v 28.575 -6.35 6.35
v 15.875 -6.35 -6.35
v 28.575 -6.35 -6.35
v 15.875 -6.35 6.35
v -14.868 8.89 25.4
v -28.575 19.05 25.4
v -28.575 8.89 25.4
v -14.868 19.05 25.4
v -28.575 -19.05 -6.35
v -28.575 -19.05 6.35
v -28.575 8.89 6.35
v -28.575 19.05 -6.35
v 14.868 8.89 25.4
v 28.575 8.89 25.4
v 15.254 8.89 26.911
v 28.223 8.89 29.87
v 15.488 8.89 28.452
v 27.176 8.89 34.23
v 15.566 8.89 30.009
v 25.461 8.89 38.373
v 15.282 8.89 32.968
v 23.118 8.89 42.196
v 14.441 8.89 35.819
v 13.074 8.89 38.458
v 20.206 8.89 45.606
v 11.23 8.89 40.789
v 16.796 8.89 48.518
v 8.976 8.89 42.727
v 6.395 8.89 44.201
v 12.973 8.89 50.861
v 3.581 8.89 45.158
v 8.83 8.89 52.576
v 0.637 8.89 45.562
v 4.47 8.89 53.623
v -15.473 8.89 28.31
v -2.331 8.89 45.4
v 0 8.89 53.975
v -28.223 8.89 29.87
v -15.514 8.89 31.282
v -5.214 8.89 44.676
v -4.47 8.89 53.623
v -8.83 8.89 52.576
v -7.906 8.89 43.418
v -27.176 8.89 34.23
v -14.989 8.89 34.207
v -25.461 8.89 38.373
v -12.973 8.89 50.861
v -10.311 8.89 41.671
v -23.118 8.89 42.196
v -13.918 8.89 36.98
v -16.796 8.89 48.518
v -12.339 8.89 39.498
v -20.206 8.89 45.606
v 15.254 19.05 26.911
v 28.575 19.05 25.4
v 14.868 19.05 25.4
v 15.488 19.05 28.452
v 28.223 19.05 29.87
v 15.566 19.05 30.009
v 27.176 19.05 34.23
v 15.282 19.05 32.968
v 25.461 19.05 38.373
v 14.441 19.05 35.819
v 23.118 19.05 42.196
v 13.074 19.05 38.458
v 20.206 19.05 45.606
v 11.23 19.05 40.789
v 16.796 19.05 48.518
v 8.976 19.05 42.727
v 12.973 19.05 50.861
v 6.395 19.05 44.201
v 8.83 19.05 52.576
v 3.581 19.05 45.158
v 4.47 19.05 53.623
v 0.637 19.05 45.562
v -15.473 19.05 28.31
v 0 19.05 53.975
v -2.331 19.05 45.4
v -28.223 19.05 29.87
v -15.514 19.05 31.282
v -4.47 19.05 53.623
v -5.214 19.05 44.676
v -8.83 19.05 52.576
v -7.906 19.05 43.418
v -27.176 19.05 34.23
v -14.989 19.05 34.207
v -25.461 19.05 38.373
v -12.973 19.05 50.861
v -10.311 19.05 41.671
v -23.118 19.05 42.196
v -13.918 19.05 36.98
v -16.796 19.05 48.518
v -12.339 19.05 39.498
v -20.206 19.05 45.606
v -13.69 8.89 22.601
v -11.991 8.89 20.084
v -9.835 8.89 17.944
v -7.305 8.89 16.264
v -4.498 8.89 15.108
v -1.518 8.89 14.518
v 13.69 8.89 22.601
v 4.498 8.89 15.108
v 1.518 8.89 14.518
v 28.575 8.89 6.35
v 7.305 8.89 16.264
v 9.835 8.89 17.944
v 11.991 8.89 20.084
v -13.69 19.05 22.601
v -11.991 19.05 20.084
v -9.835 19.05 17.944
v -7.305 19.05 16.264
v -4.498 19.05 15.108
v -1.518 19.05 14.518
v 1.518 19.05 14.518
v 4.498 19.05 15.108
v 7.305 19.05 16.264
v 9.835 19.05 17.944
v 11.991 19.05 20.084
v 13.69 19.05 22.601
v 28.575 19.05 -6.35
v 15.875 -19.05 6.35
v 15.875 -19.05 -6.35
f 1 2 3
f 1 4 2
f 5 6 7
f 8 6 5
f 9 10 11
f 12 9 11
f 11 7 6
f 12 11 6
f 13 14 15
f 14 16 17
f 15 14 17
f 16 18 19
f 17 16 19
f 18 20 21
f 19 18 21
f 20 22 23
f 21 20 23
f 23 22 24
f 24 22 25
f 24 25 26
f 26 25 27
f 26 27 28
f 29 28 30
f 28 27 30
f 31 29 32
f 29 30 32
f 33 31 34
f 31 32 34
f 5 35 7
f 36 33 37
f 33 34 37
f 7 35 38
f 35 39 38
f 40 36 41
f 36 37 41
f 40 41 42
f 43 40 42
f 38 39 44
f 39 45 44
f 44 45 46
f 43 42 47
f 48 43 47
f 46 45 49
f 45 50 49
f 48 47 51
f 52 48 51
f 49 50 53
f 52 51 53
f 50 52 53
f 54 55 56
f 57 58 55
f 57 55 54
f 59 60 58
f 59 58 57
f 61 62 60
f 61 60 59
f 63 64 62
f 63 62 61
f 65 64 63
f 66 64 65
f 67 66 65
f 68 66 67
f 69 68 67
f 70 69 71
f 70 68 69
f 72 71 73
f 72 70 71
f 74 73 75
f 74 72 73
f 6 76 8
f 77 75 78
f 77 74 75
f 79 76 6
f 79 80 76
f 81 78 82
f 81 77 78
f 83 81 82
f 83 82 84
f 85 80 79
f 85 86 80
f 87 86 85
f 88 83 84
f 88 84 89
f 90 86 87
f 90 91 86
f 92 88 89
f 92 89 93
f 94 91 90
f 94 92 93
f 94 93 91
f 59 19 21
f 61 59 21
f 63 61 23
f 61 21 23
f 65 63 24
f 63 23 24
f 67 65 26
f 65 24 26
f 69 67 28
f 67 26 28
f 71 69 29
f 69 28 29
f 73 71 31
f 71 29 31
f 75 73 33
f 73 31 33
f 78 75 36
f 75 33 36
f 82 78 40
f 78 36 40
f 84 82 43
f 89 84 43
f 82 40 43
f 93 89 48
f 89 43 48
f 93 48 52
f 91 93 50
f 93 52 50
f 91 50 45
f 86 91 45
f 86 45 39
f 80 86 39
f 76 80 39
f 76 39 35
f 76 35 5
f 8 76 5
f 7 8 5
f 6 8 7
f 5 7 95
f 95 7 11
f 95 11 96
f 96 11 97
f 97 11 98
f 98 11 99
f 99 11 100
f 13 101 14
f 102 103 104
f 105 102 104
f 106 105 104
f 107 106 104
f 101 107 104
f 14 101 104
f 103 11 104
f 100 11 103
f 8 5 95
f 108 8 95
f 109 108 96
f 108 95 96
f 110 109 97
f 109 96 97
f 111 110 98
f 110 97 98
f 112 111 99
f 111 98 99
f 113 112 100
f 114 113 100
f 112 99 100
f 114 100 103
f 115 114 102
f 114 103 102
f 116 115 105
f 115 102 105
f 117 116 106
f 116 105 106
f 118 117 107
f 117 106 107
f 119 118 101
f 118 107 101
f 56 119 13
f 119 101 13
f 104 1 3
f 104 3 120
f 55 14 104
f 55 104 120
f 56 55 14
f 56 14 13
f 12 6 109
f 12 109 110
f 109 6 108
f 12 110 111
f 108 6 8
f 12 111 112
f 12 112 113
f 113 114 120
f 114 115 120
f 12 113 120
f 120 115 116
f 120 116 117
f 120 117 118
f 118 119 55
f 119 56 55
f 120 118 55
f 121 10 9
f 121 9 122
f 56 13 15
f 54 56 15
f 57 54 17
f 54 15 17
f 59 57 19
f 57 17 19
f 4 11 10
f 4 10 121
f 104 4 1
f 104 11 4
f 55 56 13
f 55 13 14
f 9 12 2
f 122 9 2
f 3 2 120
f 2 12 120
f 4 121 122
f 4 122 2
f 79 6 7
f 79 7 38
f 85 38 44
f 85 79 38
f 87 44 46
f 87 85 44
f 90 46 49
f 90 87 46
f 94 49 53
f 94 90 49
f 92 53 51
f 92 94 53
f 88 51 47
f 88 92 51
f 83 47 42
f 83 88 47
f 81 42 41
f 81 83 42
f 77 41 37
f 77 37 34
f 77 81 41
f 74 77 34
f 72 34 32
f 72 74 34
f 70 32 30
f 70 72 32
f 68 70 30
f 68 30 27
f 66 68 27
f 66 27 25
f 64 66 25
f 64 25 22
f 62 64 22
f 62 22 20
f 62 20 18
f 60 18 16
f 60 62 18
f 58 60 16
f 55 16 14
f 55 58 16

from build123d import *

# Parameters (mm, degrees)
F0_W     = 57.15
F0_H     = 38.1
F1_DEPTH = 6.35
F2_W     = 12.7
F2_H     = 12.7
F3_DEPTH = 6.35
F4_W     = 57.15
F4_H     = 10.16
F5_DEPTH = 25.4
F7_DEPTH = 10.16
F9_DEPTH = 10.16


with BuildPart() as f1:
    # F0 (on Top) → F1 (new body, symmetric)
    with BuildSketch(Plane.XY):
        Rectangle(F0_W, F0_H)
    extrude(amount=F1_DEPTH, both=True)

    # F2 (on Top) → F3 (cut, symmetric)
    with BuildSketch(Plane.XY):
        with Locations((22.225, -12.7)):
            Rectangle(F2_W, F2_H)
    extrude(amount=F3_DEPTH, both=True, mode=Mode.SUBTRACT)

    # F4 (on Top) → F5 (join)
    with BuildSketch(Plane.XY):
        with Locations((0, 13.97)):
            Rectangle(F4_W, F4_H)
    extrude(amount=F5_DEPTH)


with BuildPart() as f7:
    # F6 (on face) → F7 (new body)
    with BuildSketch(Plane(origin=(0, 19.05, 0), x_dir=(-1, 0, 0), z_dir=(0, 1, 0))):
        with BuildLine():
            Line((-28.575, 25.4), (28.575, 25.4))
            ThreePointArc((28.575, 25.4), (0, 53.975), (-28.575, 25.4))
        make_face()
    extrude(amount=-F7_DEPTH)


with BuildPart() as f9_tool:
    # F8 (on face) → F9 (new body)
    with BuildSketch(Plane.XZ.offset(-8.89)):
        with BuildLine():
            ThreePointArc((14.8676988119, 25.4), (15.3903275706, 27.67846061), (15.5658567325, 30.0094932318))
            ThreePointArc((15.5658567325, 30.0094932318), (-2.3310326218, 45.3998208024), (-14.8676988119, 25.4))
            Line((-14.8676988119, 25.4), (14.8676988119, 25.4))
        make_face()
        with BuildLine():
            Line((14.8676988119, 25.4), (-14.8676988119, 25.4))
            ThreePointArc((-14.8676988119, 25.4), (0, 14.4436364993), (14.8676988119, 25.4))
        make_face()
    extrude(amount=-F9_DEPTH)


with BuildPart() as f1_1:
    add(f1.part)

    # F9: cut by f9_tool
    add(f9_tool.part, mode=Mode.SUBTRACT)


with BuildPart() as f7_1:
    add(f7.part)

    # F9: cut by f9_tool
    add(f9_tool.part, mode=Mode.SUBTRACT)


solid = Compound([f1_1.part, f7_1.part])
